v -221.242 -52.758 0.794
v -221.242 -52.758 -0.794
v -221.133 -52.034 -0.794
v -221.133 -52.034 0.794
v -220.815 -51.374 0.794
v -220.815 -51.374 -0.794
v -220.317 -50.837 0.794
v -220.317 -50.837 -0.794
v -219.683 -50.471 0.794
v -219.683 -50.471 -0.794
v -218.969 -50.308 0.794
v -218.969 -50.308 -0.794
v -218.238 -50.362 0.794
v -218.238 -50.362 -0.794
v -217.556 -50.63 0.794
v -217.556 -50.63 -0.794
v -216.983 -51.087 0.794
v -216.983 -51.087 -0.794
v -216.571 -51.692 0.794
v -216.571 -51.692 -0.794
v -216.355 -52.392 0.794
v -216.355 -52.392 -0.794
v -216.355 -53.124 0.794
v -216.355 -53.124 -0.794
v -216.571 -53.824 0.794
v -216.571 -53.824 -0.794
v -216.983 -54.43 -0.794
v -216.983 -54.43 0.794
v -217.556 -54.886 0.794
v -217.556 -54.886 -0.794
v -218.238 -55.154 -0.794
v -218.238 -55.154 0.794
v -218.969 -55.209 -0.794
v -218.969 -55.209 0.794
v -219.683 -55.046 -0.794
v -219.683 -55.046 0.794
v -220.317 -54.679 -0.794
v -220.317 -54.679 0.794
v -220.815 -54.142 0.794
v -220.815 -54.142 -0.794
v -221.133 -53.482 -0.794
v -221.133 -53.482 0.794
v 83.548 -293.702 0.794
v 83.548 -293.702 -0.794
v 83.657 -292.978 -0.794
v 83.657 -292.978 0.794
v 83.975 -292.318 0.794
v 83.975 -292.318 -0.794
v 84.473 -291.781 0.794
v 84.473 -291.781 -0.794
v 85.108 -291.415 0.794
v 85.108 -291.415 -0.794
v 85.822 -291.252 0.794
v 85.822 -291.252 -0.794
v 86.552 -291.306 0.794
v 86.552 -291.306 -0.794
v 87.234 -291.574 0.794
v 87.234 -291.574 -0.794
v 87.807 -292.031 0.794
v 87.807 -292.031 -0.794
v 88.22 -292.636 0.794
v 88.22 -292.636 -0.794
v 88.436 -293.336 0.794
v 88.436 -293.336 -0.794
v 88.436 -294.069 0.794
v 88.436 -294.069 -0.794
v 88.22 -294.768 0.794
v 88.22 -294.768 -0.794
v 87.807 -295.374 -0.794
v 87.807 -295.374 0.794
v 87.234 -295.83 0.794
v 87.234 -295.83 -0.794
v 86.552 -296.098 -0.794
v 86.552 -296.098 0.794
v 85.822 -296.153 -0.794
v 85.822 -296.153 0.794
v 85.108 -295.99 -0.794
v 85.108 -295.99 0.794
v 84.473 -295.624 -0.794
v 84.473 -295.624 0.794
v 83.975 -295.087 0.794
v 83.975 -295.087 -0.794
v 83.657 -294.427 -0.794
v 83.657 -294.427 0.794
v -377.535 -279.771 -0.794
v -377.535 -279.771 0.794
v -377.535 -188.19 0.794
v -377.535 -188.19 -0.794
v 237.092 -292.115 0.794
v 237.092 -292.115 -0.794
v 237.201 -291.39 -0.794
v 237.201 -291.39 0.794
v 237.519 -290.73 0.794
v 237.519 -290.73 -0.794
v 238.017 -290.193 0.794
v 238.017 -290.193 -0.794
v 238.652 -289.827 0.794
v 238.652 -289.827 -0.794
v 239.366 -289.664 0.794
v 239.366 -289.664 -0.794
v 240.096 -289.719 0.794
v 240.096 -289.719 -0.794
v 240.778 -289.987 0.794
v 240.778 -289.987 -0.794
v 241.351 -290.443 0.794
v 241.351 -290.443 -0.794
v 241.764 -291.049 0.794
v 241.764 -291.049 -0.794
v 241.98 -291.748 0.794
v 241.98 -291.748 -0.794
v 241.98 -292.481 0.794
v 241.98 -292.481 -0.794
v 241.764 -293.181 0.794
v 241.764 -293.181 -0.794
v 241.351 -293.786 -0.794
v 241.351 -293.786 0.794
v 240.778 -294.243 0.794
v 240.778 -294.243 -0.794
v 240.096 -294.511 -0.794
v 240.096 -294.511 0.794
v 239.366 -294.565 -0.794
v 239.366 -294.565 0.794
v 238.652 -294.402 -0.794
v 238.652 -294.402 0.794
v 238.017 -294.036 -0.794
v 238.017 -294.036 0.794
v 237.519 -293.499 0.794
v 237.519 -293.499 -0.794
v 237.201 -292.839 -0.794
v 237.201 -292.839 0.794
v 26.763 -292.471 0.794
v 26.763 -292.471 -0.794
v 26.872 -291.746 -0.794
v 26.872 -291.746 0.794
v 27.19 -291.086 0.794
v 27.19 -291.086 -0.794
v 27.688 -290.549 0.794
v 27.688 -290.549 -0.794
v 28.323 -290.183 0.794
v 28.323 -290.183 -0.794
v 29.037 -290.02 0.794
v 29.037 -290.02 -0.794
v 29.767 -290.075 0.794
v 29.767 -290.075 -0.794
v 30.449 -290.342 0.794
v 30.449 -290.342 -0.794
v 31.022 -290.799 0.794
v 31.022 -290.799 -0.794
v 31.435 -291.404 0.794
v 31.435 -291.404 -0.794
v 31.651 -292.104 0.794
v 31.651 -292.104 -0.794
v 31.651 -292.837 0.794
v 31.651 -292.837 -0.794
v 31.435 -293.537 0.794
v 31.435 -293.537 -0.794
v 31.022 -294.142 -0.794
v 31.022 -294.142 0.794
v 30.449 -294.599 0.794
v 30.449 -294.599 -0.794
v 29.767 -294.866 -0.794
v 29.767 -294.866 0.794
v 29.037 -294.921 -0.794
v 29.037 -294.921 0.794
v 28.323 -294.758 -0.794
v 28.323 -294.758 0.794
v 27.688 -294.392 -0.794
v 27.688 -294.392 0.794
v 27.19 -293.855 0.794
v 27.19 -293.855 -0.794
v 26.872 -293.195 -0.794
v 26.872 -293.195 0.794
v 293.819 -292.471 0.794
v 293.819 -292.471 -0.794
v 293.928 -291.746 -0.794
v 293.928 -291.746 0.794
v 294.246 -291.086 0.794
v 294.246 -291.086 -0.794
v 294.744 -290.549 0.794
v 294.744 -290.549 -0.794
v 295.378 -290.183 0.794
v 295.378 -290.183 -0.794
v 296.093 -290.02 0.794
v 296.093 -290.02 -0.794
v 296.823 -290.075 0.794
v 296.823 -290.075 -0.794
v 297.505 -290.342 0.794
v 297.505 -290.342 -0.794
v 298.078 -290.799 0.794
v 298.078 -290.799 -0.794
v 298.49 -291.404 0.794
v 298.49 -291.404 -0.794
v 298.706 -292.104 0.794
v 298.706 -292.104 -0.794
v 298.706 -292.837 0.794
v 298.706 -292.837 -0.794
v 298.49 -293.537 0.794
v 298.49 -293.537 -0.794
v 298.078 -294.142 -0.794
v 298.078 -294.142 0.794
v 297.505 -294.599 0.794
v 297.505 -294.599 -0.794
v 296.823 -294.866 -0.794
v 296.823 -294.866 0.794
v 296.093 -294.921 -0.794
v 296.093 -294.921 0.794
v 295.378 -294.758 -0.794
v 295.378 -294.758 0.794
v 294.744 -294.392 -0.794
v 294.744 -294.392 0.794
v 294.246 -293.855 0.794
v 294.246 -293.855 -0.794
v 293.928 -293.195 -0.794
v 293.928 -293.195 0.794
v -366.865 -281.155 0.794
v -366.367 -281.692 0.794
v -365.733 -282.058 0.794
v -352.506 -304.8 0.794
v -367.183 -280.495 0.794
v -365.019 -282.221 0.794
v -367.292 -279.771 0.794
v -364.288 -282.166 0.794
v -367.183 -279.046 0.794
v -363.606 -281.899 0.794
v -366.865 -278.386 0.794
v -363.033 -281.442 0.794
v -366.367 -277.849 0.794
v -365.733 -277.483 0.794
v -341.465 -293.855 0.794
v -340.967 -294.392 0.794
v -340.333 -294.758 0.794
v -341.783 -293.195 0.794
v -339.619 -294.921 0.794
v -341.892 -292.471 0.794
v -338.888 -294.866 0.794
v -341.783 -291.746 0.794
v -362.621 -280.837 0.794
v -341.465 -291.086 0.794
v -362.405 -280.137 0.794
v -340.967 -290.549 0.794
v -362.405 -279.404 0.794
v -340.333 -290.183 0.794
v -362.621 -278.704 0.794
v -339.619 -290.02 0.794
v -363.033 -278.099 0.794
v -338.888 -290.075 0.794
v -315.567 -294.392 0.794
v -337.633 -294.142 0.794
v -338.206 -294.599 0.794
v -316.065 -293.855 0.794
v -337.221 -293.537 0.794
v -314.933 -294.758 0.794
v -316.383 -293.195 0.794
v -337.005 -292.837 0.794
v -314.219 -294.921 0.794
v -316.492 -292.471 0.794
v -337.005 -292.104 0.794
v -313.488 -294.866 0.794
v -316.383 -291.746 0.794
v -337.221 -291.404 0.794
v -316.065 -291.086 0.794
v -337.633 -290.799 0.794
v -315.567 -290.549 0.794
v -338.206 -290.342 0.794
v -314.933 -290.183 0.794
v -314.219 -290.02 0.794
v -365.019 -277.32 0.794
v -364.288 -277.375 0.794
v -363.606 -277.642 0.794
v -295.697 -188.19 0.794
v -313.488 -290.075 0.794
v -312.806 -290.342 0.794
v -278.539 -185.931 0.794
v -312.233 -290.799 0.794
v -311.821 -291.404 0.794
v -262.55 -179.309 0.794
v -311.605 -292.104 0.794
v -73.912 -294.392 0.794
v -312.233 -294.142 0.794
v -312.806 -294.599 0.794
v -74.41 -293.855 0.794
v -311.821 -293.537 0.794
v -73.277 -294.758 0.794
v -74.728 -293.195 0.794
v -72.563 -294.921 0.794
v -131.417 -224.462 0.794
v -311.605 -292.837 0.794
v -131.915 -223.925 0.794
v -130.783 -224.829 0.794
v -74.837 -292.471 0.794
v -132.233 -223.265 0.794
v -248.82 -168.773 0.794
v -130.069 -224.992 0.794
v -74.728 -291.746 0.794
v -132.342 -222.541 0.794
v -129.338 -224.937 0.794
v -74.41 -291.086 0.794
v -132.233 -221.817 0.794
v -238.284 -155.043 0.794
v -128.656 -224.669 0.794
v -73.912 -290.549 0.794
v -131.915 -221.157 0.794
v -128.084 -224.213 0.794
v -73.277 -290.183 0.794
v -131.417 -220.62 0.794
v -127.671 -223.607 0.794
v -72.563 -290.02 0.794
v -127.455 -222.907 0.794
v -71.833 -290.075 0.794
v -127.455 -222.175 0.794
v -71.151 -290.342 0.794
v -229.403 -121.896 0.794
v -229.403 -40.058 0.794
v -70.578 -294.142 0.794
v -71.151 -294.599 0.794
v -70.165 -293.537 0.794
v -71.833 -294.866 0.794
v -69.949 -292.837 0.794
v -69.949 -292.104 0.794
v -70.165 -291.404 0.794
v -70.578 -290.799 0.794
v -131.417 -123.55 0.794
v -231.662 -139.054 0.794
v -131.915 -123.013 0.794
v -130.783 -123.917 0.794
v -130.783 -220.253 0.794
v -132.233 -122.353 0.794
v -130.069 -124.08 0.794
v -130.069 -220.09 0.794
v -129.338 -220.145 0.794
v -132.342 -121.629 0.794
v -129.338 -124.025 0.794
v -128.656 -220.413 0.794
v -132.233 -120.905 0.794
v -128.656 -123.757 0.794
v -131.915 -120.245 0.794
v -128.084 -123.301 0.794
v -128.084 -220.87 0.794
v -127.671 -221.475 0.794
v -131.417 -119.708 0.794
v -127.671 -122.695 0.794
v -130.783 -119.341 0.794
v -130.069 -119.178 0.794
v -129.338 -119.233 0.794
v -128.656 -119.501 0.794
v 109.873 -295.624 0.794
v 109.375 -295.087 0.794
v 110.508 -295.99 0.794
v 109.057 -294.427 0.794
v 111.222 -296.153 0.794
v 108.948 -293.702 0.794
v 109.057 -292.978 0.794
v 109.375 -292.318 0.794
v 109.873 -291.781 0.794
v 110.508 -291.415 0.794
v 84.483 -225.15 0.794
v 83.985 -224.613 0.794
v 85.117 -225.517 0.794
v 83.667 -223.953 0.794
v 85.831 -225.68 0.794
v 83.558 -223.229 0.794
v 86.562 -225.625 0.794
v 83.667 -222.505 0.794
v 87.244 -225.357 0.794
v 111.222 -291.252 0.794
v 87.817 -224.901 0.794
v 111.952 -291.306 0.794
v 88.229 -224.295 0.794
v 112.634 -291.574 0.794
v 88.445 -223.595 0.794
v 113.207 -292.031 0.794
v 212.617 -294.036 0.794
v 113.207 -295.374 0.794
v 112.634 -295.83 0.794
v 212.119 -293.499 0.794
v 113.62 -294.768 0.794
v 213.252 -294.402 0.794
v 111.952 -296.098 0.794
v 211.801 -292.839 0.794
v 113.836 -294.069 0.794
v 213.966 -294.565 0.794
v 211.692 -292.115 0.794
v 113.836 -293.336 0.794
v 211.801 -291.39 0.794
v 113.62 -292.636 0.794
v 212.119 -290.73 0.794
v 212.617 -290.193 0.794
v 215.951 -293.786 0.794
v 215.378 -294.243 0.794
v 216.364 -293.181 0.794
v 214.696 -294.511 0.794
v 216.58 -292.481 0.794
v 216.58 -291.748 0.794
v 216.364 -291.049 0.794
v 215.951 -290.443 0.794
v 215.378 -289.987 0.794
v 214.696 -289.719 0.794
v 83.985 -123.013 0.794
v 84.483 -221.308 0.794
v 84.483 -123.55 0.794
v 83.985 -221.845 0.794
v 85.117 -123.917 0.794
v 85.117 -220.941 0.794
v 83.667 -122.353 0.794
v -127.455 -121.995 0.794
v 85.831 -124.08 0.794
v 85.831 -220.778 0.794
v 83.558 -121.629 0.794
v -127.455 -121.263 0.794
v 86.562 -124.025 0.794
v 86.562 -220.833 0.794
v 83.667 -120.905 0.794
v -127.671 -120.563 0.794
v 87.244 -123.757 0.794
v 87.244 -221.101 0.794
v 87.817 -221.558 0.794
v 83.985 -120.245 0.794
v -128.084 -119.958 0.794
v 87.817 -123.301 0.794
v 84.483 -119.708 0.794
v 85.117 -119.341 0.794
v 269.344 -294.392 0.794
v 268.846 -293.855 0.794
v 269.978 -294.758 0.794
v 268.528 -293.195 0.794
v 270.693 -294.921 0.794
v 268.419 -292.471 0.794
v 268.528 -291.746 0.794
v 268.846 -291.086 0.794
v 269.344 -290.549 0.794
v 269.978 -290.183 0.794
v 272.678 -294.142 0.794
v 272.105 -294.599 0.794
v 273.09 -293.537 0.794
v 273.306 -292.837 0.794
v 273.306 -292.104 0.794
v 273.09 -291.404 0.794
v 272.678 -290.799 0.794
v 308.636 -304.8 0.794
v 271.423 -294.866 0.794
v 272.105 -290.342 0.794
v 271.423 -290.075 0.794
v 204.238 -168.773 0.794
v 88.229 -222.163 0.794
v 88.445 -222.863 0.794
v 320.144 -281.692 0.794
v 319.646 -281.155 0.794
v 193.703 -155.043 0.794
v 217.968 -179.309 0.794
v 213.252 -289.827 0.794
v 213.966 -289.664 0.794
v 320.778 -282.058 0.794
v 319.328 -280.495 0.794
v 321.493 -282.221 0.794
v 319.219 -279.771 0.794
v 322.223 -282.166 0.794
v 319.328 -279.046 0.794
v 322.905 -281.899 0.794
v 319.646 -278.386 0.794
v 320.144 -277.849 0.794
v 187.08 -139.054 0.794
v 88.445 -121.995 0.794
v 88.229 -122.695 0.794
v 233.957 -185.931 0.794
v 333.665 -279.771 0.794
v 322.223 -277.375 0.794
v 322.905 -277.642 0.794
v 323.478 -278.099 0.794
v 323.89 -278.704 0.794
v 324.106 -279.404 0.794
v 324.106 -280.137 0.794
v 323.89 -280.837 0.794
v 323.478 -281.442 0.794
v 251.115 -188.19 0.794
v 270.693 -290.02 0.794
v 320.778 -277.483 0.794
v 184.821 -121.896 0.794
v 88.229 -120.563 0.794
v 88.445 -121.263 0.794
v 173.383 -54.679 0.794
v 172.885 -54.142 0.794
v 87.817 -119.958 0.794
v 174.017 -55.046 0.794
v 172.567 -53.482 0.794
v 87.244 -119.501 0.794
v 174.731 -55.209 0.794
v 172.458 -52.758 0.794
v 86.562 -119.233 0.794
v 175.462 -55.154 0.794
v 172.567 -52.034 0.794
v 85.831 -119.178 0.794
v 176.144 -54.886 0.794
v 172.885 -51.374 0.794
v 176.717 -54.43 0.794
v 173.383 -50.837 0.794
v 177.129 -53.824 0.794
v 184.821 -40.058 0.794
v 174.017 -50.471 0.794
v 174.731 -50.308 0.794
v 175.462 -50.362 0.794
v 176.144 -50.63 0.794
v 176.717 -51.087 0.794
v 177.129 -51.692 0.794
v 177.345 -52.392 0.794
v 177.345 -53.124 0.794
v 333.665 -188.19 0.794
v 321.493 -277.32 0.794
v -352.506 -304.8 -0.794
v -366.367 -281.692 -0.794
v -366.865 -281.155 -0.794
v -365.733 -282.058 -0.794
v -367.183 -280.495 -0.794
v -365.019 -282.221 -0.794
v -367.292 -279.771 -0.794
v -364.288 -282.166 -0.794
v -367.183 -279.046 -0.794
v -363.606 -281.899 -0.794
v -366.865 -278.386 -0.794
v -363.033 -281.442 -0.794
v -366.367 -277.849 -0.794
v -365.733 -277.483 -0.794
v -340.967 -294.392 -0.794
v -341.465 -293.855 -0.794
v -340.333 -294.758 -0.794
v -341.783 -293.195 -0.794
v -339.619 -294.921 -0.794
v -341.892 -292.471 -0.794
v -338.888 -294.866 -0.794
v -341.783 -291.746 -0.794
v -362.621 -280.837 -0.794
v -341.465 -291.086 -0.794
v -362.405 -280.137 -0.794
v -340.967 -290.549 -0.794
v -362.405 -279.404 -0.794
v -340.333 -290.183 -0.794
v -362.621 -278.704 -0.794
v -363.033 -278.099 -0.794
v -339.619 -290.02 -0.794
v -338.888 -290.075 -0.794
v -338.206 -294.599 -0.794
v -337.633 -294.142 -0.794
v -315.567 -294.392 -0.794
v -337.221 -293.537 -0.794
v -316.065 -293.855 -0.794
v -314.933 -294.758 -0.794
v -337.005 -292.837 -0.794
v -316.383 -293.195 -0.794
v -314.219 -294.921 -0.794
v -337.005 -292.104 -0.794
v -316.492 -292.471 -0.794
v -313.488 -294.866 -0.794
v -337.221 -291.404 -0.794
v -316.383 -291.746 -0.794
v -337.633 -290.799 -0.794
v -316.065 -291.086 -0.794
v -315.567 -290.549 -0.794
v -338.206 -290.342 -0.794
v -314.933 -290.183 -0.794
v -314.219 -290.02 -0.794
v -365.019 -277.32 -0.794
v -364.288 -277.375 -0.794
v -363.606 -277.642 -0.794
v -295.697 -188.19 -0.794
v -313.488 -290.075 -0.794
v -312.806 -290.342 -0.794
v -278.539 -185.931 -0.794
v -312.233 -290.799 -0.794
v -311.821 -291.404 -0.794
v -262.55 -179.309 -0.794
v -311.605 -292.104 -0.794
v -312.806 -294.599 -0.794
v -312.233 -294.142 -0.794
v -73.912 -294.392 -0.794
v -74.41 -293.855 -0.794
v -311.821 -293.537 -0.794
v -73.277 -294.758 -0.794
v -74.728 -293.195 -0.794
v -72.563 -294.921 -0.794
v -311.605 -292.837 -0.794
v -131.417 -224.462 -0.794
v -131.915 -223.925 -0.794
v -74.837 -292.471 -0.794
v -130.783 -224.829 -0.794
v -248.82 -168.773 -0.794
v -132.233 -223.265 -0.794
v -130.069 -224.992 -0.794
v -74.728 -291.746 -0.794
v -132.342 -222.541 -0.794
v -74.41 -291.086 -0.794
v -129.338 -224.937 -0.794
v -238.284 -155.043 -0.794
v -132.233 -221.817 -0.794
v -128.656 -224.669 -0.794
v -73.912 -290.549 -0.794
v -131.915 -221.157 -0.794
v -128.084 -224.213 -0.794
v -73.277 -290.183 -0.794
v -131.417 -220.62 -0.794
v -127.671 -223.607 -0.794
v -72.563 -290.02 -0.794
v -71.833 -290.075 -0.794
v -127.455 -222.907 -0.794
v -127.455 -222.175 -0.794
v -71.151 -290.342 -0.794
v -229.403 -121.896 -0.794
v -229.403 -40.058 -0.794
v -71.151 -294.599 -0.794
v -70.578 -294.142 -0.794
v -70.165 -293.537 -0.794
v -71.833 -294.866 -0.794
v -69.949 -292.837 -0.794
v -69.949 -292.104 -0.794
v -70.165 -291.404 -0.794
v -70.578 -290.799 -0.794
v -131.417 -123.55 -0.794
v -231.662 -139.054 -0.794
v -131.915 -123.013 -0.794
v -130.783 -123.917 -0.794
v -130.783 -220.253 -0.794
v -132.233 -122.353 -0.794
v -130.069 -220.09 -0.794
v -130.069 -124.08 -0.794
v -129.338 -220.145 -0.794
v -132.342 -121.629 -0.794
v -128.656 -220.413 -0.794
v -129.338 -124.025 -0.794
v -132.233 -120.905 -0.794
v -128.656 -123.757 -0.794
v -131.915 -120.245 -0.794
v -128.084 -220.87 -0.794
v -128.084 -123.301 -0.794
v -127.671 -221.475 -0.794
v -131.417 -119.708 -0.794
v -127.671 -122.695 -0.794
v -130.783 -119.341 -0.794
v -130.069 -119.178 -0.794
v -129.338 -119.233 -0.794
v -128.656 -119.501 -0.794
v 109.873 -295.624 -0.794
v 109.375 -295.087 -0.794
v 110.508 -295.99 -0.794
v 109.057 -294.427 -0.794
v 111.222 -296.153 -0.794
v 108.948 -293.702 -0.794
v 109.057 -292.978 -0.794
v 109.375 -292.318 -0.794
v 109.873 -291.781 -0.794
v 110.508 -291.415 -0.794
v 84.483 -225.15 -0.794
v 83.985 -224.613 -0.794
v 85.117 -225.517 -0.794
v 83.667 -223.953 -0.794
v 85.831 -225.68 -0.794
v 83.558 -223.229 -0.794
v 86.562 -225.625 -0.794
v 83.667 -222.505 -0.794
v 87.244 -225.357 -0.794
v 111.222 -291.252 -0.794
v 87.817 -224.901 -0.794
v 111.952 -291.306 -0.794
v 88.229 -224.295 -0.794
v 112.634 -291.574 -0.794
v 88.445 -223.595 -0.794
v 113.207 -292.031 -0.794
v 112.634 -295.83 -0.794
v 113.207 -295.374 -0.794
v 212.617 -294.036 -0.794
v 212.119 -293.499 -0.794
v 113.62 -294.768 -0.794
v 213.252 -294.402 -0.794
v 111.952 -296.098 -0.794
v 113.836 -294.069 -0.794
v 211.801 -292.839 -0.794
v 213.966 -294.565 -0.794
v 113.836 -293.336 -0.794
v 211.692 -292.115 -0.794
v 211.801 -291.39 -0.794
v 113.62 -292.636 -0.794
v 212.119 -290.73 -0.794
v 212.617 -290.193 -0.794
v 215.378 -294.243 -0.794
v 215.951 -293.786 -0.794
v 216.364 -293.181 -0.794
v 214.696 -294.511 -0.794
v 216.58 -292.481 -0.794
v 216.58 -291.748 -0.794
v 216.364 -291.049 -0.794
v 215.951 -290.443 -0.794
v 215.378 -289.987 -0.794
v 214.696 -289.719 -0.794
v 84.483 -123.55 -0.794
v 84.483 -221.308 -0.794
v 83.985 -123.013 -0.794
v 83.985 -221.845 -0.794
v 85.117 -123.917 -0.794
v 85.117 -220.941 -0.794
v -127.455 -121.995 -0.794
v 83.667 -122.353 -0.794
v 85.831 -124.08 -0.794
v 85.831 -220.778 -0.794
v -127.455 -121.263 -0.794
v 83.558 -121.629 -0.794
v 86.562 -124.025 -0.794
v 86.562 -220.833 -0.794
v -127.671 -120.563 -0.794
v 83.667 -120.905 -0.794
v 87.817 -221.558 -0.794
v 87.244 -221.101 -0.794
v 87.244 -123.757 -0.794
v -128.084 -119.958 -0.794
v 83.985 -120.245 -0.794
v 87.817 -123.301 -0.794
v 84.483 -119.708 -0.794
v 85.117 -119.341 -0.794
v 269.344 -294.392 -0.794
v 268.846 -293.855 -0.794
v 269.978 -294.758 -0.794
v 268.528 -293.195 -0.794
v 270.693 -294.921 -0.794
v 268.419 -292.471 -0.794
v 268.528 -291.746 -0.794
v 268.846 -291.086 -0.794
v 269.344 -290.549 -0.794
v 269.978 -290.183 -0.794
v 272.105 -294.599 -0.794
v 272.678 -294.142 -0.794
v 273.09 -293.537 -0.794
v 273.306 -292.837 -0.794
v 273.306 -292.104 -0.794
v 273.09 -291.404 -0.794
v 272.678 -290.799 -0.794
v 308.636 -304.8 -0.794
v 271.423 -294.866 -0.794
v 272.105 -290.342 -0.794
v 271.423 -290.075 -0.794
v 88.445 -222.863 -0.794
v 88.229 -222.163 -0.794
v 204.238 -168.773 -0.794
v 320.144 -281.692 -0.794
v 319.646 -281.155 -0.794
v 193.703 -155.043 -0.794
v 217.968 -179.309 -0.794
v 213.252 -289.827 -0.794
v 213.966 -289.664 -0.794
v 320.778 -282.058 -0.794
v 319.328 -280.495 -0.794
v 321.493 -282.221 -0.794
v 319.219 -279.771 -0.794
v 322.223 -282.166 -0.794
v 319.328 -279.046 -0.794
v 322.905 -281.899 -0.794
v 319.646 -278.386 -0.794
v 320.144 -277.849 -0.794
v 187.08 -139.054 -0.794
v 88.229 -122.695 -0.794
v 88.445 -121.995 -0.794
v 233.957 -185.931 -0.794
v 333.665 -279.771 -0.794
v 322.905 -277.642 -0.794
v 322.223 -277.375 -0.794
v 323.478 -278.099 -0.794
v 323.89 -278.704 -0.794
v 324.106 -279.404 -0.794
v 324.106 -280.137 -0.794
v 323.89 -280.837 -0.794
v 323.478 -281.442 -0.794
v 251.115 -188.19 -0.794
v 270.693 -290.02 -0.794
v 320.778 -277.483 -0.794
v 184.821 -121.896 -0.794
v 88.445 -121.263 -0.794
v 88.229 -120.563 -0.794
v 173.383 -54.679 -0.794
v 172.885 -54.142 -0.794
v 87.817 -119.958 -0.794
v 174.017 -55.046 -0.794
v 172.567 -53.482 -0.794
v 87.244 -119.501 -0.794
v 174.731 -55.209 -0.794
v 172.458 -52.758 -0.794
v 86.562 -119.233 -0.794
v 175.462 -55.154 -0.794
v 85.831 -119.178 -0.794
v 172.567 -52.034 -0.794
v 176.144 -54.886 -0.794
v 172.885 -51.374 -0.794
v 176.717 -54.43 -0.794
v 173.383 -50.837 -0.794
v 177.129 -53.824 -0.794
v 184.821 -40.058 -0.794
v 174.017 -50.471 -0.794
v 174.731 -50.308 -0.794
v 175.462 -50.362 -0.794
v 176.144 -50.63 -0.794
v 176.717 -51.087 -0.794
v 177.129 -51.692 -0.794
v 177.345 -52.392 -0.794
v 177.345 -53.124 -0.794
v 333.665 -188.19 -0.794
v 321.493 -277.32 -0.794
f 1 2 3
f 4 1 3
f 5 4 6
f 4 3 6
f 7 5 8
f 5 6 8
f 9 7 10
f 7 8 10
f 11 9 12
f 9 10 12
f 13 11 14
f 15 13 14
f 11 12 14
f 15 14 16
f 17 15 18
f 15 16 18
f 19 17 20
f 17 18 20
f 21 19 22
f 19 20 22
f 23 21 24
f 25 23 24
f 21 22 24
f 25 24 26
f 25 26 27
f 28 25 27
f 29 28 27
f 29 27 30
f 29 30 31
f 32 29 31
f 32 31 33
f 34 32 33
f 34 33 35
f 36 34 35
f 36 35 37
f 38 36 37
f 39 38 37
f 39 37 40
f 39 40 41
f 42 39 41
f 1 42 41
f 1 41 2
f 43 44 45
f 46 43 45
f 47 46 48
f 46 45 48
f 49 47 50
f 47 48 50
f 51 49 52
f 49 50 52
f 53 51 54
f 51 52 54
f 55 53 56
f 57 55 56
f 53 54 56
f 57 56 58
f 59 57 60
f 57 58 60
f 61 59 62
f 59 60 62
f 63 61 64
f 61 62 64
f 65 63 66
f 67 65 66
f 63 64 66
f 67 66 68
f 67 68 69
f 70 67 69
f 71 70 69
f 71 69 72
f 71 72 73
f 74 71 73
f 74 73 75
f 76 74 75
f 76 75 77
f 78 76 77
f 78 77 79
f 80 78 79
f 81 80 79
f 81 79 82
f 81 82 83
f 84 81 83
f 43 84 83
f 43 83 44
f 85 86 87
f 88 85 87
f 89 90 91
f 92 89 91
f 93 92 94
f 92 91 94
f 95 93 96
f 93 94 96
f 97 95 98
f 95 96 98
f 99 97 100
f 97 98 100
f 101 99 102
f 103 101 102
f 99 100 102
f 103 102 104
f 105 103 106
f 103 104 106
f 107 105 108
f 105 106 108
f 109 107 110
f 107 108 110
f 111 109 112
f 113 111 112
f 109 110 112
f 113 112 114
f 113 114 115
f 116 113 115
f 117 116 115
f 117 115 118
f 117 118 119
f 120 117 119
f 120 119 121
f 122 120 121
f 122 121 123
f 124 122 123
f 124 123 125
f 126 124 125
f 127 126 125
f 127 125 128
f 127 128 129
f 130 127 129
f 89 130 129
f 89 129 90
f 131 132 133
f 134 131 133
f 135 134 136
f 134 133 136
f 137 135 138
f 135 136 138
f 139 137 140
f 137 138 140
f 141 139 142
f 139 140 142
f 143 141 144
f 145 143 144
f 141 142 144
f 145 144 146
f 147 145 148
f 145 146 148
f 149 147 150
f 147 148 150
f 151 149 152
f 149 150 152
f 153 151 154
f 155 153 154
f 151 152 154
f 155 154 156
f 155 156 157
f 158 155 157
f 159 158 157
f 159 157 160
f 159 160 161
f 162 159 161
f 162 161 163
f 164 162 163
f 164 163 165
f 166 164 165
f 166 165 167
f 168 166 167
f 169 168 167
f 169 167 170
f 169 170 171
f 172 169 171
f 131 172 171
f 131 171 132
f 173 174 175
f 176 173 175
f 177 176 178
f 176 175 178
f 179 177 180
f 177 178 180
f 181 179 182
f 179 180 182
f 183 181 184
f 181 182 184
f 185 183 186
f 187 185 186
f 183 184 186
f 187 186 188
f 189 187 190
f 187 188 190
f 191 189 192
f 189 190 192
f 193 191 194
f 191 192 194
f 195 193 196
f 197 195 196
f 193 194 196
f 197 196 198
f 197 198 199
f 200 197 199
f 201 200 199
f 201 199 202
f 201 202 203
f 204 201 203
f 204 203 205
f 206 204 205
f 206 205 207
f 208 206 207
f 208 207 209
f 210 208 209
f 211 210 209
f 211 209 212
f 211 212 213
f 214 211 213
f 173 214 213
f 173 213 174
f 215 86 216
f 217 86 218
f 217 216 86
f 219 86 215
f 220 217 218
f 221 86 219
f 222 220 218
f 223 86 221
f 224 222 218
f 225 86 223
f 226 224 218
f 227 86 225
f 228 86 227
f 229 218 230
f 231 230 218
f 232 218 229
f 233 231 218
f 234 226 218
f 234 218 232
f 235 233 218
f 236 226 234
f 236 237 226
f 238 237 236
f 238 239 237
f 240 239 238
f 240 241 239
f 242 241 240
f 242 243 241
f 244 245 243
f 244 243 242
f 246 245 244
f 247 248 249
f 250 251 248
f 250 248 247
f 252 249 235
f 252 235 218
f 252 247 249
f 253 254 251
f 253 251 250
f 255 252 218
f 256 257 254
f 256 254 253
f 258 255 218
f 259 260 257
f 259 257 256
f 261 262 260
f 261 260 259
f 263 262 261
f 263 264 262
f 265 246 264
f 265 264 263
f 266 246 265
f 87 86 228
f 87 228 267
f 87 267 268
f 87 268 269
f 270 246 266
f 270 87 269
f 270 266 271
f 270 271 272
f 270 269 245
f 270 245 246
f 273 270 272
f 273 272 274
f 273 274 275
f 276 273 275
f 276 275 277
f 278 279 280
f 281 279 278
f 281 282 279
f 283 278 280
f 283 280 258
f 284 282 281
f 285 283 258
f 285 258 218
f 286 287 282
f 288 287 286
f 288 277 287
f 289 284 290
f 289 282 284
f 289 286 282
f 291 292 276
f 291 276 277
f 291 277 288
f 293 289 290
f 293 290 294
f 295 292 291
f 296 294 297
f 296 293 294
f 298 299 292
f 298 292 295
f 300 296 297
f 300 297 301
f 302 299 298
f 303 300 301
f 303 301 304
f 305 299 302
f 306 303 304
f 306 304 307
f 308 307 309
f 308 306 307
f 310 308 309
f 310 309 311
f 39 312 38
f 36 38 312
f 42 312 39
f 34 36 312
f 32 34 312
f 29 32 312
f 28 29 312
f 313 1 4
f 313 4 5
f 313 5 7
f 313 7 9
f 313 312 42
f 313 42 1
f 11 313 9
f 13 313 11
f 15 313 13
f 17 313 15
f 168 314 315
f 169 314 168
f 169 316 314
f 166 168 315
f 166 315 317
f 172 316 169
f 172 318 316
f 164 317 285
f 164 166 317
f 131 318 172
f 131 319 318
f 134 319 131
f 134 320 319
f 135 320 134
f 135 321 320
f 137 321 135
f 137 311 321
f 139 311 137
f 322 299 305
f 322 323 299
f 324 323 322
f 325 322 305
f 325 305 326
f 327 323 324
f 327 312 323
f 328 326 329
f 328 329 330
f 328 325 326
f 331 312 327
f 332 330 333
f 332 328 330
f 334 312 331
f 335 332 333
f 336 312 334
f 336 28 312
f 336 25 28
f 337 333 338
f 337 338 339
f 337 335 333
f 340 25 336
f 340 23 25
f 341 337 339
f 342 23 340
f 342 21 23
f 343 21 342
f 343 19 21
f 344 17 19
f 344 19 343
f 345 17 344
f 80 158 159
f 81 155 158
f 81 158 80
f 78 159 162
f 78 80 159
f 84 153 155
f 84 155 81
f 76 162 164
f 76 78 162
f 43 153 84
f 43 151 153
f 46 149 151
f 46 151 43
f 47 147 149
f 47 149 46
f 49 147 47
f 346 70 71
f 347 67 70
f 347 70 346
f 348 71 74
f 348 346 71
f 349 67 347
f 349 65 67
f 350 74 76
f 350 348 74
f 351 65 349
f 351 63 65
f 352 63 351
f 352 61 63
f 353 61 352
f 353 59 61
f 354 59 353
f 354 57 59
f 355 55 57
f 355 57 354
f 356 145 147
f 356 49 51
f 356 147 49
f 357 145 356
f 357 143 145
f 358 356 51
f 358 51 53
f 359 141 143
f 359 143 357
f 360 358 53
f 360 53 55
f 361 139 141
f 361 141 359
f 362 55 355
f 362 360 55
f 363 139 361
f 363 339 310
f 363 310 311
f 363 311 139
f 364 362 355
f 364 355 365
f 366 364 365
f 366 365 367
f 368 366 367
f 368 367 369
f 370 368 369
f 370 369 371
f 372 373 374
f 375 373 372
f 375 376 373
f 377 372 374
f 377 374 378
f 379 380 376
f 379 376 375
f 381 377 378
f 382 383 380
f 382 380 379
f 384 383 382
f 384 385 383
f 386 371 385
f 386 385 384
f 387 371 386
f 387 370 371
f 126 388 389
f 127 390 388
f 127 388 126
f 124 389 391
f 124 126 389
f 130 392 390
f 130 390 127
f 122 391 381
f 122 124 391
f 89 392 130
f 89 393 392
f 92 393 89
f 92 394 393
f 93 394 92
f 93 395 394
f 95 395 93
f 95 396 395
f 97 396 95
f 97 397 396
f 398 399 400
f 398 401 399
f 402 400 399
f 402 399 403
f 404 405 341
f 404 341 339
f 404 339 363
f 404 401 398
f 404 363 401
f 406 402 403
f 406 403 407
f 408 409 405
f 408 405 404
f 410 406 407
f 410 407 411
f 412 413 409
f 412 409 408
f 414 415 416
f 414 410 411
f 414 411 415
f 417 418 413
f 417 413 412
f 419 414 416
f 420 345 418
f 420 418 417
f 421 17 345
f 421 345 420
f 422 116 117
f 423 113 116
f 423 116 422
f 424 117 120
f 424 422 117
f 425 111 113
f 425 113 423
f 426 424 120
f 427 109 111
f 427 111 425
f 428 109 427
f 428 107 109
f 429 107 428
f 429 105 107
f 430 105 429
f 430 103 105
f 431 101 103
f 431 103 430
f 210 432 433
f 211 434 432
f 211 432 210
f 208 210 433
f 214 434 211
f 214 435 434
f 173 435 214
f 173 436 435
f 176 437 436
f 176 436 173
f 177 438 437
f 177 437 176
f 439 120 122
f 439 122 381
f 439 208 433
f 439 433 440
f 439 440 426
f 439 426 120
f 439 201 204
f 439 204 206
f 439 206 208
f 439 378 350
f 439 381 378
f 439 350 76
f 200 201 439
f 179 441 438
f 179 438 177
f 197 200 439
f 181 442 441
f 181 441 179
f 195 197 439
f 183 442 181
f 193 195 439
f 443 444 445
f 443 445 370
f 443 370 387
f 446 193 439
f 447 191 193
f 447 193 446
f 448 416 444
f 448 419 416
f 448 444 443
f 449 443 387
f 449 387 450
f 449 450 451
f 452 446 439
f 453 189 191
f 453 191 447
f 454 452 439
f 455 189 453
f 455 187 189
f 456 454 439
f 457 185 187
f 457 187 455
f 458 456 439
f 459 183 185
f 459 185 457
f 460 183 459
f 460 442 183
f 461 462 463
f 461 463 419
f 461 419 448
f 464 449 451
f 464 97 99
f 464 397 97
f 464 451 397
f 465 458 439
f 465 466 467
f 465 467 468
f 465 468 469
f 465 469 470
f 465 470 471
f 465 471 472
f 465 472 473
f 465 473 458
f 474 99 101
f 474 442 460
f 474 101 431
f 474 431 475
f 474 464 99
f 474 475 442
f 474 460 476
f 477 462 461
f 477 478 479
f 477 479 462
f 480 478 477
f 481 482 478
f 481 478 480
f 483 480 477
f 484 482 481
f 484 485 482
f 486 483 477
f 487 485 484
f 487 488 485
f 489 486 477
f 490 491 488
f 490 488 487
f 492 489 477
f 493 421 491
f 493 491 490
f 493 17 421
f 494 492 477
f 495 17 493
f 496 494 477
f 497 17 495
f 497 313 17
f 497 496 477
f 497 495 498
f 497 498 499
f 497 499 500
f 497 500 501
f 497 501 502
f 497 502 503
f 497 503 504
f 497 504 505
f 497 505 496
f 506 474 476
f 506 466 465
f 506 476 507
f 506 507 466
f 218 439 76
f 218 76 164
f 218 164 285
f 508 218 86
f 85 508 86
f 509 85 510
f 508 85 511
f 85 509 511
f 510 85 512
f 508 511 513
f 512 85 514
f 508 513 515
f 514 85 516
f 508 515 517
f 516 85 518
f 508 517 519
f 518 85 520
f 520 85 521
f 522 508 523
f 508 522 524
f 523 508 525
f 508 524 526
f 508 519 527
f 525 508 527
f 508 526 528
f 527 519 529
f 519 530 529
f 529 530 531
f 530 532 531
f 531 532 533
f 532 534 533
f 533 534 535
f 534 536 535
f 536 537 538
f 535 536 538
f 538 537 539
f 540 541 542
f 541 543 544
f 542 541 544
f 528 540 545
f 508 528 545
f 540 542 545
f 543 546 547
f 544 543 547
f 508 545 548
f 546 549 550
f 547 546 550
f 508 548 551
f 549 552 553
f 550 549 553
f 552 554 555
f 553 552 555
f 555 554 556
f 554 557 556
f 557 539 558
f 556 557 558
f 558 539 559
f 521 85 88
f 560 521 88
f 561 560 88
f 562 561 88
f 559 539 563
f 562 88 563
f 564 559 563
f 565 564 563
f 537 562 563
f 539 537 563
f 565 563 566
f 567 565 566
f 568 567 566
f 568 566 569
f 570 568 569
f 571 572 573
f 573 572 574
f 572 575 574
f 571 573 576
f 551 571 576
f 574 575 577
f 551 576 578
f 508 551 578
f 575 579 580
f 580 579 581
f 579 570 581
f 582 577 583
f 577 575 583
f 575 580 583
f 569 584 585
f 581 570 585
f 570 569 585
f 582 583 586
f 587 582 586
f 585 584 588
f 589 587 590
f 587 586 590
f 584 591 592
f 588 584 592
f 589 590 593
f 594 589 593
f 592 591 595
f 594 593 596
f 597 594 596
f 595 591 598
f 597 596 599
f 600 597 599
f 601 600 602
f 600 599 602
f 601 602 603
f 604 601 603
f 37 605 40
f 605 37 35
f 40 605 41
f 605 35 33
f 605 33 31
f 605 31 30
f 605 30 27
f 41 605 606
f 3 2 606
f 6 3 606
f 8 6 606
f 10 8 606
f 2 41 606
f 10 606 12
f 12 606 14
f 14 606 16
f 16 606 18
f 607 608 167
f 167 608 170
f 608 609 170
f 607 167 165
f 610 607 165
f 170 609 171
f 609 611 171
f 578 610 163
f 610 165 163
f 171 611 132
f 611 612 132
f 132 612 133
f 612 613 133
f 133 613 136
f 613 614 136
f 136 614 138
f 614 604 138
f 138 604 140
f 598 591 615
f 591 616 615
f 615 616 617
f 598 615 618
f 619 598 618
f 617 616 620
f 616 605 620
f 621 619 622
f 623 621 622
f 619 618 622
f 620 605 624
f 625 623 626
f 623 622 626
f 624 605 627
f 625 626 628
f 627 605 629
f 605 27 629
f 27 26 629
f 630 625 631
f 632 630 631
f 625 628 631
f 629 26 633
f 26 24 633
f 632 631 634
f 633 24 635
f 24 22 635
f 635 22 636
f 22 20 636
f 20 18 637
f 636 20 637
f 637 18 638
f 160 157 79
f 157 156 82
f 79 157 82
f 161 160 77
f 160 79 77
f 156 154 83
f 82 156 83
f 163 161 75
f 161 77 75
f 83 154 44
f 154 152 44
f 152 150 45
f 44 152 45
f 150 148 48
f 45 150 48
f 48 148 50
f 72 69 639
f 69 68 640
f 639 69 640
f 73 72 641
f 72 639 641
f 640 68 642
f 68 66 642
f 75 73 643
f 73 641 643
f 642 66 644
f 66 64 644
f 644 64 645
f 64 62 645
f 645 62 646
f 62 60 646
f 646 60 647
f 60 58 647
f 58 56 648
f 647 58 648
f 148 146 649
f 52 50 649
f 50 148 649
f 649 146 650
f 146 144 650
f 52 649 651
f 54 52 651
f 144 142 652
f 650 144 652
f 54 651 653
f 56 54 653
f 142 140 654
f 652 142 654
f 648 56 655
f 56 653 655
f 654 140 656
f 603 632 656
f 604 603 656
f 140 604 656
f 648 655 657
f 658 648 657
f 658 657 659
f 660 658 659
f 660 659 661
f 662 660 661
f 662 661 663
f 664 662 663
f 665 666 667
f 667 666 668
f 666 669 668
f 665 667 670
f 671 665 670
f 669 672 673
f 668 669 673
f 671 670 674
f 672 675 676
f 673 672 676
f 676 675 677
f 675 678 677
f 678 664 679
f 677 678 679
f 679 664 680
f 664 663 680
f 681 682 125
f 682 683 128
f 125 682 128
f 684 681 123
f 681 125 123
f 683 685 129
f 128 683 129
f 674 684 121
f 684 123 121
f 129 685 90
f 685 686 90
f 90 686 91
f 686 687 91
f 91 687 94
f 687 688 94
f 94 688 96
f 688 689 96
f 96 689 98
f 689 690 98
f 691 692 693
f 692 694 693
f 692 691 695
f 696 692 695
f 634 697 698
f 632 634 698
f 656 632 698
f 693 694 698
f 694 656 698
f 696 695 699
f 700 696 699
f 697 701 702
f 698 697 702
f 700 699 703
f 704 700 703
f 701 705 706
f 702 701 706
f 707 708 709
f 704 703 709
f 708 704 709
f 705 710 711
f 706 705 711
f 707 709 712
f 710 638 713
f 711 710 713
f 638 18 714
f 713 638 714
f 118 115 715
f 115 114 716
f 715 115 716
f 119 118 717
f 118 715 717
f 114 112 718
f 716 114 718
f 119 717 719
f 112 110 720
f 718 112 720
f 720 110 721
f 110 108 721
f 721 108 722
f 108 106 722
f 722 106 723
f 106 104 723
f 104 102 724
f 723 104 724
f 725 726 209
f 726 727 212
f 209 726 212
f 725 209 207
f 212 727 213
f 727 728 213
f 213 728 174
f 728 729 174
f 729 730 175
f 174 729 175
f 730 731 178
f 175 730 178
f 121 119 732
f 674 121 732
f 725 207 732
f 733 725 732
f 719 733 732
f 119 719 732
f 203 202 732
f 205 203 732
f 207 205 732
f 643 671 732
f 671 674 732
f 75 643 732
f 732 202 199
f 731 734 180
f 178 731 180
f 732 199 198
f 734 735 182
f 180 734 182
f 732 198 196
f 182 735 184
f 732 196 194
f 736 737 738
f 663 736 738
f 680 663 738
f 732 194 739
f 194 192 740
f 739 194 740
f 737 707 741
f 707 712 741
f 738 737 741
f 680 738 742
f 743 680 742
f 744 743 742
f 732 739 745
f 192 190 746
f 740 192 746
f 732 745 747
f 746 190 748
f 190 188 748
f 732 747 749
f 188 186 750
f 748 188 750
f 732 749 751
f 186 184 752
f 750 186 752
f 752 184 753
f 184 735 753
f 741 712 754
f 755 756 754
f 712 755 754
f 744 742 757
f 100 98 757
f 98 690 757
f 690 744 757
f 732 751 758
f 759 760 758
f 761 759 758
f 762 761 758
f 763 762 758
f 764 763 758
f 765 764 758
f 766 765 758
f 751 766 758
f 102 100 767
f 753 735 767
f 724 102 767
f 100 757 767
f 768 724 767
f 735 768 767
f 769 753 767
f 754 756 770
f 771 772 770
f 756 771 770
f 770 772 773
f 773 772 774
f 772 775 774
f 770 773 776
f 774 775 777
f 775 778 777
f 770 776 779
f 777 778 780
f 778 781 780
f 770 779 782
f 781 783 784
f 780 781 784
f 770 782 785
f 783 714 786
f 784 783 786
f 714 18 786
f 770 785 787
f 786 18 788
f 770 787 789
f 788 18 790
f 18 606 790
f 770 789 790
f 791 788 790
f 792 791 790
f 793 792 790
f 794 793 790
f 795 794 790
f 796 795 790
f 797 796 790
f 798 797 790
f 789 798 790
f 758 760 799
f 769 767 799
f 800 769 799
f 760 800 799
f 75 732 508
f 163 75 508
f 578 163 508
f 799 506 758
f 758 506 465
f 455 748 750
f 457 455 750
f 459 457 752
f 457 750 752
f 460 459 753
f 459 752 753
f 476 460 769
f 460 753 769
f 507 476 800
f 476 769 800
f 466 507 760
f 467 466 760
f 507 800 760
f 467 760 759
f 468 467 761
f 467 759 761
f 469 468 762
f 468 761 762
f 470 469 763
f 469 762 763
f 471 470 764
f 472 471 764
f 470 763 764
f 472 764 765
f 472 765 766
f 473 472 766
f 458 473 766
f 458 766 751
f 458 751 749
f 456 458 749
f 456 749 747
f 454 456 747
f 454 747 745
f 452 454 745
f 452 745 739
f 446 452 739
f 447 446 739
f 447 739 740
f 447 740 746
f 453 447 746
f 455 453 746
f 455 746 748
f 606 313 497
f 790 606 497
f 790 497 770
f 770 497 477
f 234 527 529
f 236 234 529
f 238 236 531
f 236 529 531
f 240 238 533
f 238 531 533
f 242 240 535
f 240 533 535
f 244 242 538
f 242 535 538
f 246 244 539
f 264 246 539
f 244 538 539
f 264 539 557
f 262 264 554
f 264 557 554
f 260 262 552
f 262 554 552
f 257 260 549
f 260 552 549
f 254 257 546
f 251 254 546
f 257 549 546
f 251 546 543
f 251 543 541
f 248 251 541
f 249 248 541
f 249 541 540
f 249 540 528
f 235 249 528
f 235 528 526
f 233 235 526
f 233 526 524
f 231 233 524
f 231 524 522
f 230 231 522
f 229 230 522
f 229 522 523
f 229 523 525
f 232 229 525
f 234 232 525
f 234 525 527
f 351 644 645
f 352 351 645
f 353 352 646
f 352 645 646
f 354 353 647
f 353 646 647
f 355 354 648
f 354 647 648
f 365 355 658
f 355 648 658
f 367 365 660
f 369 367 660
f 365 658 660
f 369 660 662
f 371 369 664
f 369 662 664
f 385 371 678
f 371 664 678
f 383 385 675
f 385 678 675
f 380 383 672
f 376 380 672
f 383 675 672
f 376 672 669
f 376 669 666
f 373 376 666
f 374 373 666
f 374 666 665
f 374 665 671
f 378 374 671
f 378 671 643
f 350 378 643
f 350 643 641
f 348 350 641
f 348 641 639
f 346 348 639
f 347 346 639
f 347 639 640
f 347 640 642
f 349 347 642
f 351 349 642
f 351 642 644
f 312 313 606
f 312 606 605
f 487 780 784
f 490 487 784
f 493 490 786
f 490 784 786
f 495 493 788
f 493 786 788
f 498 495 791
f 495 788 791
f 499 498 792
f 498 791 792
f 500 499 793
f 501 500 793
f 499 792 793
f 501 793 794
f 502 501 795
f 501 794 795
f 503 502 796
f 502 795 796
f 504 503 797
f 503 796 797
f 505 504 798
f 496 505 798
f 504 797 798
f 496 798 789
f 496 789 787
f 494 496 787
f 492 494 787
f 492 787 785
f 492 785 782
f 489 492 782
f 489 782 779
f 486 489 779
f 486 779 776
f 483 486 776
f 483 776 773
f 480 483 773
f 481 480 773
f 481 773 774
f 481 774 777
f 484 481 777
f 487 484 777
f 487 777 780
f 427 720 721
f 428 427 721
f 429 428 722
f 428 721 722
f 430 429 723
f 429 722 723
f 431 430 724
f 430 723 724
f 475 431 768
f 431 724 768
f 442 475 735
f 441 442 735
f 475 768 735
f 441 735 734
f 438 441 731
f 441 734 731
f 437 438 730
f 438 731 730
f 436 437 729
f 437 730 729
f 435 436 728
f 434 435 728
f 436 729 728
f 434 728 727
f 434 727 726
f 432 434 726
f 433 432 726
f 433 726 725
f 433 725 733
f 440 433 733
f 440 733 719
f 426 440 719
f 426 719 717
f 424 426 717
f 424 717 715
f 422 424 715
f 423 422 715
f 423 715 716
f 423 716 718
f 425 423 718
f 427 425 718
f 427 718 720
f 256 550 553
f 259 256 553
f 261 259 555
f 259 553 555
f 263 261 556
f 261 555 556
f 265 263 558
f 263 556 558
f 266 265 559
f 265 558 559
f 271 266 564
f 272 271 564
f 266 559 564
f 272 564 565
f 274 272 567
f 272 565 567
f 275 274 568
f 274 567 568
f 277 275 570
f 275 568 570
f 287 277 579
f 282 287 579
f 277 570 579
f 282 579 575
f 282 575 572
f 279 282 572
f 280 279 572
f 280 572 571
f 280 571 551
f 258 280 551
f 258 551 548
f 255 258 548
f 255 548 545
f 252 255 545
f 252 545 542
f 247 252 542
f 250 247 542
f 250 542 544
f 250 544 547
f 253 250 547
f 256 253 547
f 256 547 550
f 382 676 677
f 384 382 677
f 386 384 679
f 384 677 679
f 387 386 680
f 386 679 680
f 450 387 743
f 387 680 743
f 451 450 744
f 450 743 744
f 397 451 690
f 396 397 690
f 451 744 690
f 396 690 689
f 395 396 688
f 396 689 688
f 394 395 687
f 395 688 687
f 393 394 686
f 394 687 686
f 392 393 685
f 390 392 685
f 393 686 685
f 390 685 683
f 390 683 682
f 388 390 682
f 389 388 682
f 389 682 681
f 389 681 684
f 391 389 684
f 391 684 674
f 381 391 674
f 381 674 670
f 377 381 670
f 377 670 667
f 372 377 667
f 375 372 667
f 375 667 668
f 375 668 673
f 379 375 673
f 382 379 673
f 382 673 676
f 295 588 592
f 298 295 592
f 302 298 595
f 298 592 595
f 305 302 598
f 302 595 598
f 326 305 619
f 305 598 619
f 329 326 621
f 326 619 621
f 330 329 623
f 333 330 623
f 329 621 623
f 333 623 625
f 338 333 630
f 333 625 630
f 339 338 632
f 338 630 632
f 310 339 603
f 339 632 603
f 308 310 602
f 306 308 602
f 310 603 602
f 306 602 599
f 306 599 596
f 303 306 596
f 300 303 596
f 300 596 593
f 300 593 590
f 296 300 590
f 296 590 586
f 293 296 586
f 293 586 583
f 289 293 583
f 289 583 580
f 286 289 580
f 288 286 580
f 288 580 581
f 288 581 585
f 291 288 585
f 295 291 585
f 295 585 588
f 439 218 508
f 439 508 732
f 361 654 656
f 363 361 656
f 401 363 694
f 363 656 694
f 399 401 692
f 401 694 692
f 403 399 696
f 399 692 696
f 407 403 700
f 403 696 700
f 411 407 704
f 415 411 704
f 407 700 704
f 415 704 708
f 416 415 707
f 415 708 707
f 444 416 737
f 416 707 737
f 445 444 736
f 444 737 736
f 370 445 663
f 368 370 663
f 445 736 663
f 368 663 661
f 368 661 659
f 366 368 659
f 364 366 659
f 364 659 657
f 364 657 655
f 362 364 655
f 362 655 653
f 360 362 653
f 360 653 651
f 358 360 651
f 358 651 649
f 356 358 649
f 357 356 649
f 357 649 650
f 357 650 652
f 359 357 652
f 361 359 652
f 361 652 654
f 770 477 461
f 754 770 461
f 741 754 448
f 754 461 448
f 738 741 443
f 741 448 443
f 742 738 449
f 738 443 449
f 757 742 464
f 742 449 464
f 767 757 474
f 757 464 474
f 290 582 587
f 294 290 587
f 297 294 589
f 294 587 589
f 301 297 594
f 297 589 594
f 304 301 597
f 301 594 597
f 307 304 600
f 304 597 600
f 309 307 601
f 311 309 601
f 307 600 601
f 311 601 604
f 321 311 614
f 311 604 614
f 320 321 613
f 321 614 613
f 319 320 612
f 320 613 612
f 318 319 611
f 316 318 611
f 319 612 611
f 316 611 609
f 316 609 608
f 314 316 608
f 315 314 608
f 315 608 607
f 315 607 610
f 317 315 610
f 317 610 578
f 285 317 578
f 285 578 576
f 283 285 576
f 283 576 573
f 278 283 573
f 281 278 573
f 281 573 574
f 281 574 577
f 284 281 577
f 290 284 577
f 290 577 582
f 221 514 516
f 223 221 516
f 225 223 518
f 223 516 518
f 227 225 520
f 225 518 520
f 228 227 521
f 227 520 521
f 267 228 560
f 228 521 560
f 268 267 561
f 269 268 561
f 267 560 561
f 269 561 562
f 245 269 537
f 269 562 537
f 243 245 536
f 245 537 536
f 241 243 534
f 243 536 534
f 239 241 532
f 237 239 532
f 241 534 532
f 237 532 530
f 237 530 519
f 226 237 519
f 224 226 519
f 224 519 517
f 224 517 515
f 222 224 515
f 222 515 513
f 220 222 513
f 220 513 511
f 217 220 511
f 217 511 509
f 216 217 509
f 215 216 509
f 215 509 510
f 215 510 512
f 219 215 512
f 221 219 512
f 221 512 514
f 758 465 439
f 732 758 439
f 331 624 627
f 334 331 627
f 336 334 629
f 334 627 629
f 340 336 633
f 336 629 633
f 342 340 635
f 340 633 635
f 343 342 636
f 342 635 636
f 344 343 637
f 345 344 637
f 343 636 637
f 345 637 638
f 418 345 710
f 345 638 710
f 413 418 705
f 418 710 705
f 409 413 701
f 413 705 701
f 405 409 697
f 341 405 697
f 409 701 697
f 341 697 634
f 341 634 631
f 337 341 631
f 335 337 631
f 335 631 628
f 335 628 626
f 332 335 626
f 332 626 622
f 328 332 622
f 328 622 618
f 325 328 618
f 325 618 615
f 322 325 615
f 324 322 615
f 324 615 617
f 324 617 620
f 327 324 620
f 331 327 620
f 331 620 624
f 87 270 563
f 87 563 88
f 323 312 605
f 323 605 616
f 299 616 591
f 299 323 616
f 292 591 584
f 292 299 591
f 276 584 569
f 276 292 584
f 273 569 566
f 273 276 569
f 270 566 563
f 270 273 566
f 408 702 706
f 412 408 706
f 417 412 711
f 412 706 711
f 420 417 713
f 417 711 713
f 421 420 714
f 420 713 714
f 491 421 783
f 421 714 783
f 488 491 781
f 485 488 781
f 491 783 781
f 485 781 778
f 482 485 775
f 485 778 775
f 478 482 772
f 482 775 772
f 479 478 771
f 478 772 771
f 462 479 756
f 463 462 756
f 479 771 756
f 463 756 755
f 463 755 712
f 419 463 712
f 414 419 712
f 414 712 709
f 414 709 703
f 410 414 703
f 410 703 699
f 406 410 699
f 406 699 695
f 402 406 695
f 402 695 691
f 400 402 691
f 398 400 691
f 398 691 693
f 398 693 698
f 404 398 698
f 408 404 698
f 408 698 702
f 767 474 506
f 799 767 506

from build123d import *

# Parameters (mm, degrees)
SKETCH3_W                    = 914.4
SKETCH3_H                    = 609.6
BOSS_EXTRUDE1_DEPTH          = 0.79375
SKETCH4_OUTSIDE_W            = 1136.194
SKETCH4_OUTSIDE_H            = 831.394
CUT_EXTRUDE1_DEPTH           = 2.54
CUT_EXTRUDE2_DEPTH           = 2.54
CUT_EXTRUDE3_DEPTH           = 2.54
F_10_0_1935_DIAMETER_HOLE1_D = 4.9149
F_10_0_1935_DIAMETER_HOLE2_D = 4.9149


with BuildPart() as part:
    # Sketch3 → Boss-Extrude1 (new, symmetric)
    with BuildSketch(Plane.XY):
        Rectangle(SKETCH3_W, SKETCH3_H)
    extrude(amount=BOSS_EXTRUDE1_DEPTH, both=True)

    # Sketch4 outside → Cut-Extrude1 (cut)
    with BuildSketch(Plane.XY.offset(0.79375)):
        Rectangle(SKETCH4_OUTSIDE_W, SKETCH4_OUTSIDE_H)
        with BuildLine():
            Line((-352.134938229, -305.170644008), (-377.534938229, -279.770644008))
            Line((-377.534938229, -279.770644008), (-377.534938229, -42.598144008))
            ThreePointArc((-377.534938229, -42.598144008), (-376.790989453, -40.802092784), (-374.994938229, -40.058144008))
            Line((-374.994938229, -40.058144008), (331.125061771, -40.058144008))
            ThreePointArc((331.125061771, -40.058144008), (332.921112995, -40.802092784), (333.665061771, -42.598144008))
            Line((333.665061771, -42.598144008), (333.665061771, -279.770644008))
            Line((333.665061771, -279.770644008), (308.265061771, -305.170644008))
            Line((308.265061771, -305.170644008), (-352.134938229, -305.170644008))
        make_face(mode=Mode.SUBTRACT)
    extrude(amount=-CUT_EXTRUDE1_DEPTH, mode=Mode.SUBTRACT)

    # Sketch7 → Cut-Extrude2 (cut)
    with BuildSketch(Plane.XY.offset(0.79375)):
        with BuildLine():
            Line((-377.534938229, -188.190344021), (-377.534938229, -40.058144008))
            Line((-377.534938229, -40.058144008), (-229.402738216, -40.058144008))
            Line((-229.402738216, -40.058144008), (-229.402738216, -64.746344021))
            Line((-229.402738216, -64.746344021), (-229.402738216, -121.896344021))
            ThreePointArc((-229.402738216, -121.896344021), (-248.819801264, -168.773280973), (-295.696738216, -188.190344021))
            Line((-295.696738216, -188.190344021), (-352.846738216, -188.190344021))
            Line((-352.846738216, -188.190344021), (-377.534938229, -188.190344021))
        make_face()
    extrude(amount=-CUT_EXTRUDE2_DEPTH, mode=Mode.SUBTRACT)

    # Sketch8 → Cut-Extrude3 (cut)
    with BuildSketch(Plane.XY.offset(0.79375)):
        with BuildLine():
            Line((251.115061771, -188.190344021), (336.840061771, -188.190344021))
            Line((336.840061771, -188.190344021), (336.840061771, -36.171344021))
            Line((336.840061771, -36.171344021), (184.821061771, -36.171344021))
            Line((184.821061771, -36.171344021), (184.821061771, -121.896344021))
            ThreePointArc((184.821061771, -121.896344021), (204.238124819, -168.773280973), (251.115061771, -188.190344021))
        make_face()
    extrude(amount=-CUT_EXTRUDE3_DEPTH, mode=Mode.SUBTRACT)

    # #10 (0.1935) Diameter Hole1 (through all)
    with Locations(Plane.XY.offset(0.79375)):
        with Locations((-314.034938229, -292.470644008), (-339.434938229, -292.470644008), (-364.834938229, -279.770644008), (86.005546883, -293.702239208), (111.405546883, -293.702239208), (214.149530262, -292.114748821), (239.549530262, -292.114748821), (296.276261771, -292.470644008), (270.876261771, -292.470644008), (321.676261771, -279.770644008), (174.915061771, -52.758144008), (-218.784938229, -52.758144008), (-72.379338229, -292.470644008), (29.220661771, -292.470644008)):
            Hole(F_10_0_1935_DIAMETER_HOLE1_D / 2)

    # #10 (0.1935) Diameter Hole2 (through all)
    with Locations(Plane.XY.offset(0.79375)):
        with Locations((-129.88493833, -121.629072033), (-129.88493833, -222.541034234), (86.015061873, -223.229071976), (86.015061873, -121.629072033)):
            Hole(F_10_0_1935_DIAMETER_HOLE2_D / 2)


solid = part.part
